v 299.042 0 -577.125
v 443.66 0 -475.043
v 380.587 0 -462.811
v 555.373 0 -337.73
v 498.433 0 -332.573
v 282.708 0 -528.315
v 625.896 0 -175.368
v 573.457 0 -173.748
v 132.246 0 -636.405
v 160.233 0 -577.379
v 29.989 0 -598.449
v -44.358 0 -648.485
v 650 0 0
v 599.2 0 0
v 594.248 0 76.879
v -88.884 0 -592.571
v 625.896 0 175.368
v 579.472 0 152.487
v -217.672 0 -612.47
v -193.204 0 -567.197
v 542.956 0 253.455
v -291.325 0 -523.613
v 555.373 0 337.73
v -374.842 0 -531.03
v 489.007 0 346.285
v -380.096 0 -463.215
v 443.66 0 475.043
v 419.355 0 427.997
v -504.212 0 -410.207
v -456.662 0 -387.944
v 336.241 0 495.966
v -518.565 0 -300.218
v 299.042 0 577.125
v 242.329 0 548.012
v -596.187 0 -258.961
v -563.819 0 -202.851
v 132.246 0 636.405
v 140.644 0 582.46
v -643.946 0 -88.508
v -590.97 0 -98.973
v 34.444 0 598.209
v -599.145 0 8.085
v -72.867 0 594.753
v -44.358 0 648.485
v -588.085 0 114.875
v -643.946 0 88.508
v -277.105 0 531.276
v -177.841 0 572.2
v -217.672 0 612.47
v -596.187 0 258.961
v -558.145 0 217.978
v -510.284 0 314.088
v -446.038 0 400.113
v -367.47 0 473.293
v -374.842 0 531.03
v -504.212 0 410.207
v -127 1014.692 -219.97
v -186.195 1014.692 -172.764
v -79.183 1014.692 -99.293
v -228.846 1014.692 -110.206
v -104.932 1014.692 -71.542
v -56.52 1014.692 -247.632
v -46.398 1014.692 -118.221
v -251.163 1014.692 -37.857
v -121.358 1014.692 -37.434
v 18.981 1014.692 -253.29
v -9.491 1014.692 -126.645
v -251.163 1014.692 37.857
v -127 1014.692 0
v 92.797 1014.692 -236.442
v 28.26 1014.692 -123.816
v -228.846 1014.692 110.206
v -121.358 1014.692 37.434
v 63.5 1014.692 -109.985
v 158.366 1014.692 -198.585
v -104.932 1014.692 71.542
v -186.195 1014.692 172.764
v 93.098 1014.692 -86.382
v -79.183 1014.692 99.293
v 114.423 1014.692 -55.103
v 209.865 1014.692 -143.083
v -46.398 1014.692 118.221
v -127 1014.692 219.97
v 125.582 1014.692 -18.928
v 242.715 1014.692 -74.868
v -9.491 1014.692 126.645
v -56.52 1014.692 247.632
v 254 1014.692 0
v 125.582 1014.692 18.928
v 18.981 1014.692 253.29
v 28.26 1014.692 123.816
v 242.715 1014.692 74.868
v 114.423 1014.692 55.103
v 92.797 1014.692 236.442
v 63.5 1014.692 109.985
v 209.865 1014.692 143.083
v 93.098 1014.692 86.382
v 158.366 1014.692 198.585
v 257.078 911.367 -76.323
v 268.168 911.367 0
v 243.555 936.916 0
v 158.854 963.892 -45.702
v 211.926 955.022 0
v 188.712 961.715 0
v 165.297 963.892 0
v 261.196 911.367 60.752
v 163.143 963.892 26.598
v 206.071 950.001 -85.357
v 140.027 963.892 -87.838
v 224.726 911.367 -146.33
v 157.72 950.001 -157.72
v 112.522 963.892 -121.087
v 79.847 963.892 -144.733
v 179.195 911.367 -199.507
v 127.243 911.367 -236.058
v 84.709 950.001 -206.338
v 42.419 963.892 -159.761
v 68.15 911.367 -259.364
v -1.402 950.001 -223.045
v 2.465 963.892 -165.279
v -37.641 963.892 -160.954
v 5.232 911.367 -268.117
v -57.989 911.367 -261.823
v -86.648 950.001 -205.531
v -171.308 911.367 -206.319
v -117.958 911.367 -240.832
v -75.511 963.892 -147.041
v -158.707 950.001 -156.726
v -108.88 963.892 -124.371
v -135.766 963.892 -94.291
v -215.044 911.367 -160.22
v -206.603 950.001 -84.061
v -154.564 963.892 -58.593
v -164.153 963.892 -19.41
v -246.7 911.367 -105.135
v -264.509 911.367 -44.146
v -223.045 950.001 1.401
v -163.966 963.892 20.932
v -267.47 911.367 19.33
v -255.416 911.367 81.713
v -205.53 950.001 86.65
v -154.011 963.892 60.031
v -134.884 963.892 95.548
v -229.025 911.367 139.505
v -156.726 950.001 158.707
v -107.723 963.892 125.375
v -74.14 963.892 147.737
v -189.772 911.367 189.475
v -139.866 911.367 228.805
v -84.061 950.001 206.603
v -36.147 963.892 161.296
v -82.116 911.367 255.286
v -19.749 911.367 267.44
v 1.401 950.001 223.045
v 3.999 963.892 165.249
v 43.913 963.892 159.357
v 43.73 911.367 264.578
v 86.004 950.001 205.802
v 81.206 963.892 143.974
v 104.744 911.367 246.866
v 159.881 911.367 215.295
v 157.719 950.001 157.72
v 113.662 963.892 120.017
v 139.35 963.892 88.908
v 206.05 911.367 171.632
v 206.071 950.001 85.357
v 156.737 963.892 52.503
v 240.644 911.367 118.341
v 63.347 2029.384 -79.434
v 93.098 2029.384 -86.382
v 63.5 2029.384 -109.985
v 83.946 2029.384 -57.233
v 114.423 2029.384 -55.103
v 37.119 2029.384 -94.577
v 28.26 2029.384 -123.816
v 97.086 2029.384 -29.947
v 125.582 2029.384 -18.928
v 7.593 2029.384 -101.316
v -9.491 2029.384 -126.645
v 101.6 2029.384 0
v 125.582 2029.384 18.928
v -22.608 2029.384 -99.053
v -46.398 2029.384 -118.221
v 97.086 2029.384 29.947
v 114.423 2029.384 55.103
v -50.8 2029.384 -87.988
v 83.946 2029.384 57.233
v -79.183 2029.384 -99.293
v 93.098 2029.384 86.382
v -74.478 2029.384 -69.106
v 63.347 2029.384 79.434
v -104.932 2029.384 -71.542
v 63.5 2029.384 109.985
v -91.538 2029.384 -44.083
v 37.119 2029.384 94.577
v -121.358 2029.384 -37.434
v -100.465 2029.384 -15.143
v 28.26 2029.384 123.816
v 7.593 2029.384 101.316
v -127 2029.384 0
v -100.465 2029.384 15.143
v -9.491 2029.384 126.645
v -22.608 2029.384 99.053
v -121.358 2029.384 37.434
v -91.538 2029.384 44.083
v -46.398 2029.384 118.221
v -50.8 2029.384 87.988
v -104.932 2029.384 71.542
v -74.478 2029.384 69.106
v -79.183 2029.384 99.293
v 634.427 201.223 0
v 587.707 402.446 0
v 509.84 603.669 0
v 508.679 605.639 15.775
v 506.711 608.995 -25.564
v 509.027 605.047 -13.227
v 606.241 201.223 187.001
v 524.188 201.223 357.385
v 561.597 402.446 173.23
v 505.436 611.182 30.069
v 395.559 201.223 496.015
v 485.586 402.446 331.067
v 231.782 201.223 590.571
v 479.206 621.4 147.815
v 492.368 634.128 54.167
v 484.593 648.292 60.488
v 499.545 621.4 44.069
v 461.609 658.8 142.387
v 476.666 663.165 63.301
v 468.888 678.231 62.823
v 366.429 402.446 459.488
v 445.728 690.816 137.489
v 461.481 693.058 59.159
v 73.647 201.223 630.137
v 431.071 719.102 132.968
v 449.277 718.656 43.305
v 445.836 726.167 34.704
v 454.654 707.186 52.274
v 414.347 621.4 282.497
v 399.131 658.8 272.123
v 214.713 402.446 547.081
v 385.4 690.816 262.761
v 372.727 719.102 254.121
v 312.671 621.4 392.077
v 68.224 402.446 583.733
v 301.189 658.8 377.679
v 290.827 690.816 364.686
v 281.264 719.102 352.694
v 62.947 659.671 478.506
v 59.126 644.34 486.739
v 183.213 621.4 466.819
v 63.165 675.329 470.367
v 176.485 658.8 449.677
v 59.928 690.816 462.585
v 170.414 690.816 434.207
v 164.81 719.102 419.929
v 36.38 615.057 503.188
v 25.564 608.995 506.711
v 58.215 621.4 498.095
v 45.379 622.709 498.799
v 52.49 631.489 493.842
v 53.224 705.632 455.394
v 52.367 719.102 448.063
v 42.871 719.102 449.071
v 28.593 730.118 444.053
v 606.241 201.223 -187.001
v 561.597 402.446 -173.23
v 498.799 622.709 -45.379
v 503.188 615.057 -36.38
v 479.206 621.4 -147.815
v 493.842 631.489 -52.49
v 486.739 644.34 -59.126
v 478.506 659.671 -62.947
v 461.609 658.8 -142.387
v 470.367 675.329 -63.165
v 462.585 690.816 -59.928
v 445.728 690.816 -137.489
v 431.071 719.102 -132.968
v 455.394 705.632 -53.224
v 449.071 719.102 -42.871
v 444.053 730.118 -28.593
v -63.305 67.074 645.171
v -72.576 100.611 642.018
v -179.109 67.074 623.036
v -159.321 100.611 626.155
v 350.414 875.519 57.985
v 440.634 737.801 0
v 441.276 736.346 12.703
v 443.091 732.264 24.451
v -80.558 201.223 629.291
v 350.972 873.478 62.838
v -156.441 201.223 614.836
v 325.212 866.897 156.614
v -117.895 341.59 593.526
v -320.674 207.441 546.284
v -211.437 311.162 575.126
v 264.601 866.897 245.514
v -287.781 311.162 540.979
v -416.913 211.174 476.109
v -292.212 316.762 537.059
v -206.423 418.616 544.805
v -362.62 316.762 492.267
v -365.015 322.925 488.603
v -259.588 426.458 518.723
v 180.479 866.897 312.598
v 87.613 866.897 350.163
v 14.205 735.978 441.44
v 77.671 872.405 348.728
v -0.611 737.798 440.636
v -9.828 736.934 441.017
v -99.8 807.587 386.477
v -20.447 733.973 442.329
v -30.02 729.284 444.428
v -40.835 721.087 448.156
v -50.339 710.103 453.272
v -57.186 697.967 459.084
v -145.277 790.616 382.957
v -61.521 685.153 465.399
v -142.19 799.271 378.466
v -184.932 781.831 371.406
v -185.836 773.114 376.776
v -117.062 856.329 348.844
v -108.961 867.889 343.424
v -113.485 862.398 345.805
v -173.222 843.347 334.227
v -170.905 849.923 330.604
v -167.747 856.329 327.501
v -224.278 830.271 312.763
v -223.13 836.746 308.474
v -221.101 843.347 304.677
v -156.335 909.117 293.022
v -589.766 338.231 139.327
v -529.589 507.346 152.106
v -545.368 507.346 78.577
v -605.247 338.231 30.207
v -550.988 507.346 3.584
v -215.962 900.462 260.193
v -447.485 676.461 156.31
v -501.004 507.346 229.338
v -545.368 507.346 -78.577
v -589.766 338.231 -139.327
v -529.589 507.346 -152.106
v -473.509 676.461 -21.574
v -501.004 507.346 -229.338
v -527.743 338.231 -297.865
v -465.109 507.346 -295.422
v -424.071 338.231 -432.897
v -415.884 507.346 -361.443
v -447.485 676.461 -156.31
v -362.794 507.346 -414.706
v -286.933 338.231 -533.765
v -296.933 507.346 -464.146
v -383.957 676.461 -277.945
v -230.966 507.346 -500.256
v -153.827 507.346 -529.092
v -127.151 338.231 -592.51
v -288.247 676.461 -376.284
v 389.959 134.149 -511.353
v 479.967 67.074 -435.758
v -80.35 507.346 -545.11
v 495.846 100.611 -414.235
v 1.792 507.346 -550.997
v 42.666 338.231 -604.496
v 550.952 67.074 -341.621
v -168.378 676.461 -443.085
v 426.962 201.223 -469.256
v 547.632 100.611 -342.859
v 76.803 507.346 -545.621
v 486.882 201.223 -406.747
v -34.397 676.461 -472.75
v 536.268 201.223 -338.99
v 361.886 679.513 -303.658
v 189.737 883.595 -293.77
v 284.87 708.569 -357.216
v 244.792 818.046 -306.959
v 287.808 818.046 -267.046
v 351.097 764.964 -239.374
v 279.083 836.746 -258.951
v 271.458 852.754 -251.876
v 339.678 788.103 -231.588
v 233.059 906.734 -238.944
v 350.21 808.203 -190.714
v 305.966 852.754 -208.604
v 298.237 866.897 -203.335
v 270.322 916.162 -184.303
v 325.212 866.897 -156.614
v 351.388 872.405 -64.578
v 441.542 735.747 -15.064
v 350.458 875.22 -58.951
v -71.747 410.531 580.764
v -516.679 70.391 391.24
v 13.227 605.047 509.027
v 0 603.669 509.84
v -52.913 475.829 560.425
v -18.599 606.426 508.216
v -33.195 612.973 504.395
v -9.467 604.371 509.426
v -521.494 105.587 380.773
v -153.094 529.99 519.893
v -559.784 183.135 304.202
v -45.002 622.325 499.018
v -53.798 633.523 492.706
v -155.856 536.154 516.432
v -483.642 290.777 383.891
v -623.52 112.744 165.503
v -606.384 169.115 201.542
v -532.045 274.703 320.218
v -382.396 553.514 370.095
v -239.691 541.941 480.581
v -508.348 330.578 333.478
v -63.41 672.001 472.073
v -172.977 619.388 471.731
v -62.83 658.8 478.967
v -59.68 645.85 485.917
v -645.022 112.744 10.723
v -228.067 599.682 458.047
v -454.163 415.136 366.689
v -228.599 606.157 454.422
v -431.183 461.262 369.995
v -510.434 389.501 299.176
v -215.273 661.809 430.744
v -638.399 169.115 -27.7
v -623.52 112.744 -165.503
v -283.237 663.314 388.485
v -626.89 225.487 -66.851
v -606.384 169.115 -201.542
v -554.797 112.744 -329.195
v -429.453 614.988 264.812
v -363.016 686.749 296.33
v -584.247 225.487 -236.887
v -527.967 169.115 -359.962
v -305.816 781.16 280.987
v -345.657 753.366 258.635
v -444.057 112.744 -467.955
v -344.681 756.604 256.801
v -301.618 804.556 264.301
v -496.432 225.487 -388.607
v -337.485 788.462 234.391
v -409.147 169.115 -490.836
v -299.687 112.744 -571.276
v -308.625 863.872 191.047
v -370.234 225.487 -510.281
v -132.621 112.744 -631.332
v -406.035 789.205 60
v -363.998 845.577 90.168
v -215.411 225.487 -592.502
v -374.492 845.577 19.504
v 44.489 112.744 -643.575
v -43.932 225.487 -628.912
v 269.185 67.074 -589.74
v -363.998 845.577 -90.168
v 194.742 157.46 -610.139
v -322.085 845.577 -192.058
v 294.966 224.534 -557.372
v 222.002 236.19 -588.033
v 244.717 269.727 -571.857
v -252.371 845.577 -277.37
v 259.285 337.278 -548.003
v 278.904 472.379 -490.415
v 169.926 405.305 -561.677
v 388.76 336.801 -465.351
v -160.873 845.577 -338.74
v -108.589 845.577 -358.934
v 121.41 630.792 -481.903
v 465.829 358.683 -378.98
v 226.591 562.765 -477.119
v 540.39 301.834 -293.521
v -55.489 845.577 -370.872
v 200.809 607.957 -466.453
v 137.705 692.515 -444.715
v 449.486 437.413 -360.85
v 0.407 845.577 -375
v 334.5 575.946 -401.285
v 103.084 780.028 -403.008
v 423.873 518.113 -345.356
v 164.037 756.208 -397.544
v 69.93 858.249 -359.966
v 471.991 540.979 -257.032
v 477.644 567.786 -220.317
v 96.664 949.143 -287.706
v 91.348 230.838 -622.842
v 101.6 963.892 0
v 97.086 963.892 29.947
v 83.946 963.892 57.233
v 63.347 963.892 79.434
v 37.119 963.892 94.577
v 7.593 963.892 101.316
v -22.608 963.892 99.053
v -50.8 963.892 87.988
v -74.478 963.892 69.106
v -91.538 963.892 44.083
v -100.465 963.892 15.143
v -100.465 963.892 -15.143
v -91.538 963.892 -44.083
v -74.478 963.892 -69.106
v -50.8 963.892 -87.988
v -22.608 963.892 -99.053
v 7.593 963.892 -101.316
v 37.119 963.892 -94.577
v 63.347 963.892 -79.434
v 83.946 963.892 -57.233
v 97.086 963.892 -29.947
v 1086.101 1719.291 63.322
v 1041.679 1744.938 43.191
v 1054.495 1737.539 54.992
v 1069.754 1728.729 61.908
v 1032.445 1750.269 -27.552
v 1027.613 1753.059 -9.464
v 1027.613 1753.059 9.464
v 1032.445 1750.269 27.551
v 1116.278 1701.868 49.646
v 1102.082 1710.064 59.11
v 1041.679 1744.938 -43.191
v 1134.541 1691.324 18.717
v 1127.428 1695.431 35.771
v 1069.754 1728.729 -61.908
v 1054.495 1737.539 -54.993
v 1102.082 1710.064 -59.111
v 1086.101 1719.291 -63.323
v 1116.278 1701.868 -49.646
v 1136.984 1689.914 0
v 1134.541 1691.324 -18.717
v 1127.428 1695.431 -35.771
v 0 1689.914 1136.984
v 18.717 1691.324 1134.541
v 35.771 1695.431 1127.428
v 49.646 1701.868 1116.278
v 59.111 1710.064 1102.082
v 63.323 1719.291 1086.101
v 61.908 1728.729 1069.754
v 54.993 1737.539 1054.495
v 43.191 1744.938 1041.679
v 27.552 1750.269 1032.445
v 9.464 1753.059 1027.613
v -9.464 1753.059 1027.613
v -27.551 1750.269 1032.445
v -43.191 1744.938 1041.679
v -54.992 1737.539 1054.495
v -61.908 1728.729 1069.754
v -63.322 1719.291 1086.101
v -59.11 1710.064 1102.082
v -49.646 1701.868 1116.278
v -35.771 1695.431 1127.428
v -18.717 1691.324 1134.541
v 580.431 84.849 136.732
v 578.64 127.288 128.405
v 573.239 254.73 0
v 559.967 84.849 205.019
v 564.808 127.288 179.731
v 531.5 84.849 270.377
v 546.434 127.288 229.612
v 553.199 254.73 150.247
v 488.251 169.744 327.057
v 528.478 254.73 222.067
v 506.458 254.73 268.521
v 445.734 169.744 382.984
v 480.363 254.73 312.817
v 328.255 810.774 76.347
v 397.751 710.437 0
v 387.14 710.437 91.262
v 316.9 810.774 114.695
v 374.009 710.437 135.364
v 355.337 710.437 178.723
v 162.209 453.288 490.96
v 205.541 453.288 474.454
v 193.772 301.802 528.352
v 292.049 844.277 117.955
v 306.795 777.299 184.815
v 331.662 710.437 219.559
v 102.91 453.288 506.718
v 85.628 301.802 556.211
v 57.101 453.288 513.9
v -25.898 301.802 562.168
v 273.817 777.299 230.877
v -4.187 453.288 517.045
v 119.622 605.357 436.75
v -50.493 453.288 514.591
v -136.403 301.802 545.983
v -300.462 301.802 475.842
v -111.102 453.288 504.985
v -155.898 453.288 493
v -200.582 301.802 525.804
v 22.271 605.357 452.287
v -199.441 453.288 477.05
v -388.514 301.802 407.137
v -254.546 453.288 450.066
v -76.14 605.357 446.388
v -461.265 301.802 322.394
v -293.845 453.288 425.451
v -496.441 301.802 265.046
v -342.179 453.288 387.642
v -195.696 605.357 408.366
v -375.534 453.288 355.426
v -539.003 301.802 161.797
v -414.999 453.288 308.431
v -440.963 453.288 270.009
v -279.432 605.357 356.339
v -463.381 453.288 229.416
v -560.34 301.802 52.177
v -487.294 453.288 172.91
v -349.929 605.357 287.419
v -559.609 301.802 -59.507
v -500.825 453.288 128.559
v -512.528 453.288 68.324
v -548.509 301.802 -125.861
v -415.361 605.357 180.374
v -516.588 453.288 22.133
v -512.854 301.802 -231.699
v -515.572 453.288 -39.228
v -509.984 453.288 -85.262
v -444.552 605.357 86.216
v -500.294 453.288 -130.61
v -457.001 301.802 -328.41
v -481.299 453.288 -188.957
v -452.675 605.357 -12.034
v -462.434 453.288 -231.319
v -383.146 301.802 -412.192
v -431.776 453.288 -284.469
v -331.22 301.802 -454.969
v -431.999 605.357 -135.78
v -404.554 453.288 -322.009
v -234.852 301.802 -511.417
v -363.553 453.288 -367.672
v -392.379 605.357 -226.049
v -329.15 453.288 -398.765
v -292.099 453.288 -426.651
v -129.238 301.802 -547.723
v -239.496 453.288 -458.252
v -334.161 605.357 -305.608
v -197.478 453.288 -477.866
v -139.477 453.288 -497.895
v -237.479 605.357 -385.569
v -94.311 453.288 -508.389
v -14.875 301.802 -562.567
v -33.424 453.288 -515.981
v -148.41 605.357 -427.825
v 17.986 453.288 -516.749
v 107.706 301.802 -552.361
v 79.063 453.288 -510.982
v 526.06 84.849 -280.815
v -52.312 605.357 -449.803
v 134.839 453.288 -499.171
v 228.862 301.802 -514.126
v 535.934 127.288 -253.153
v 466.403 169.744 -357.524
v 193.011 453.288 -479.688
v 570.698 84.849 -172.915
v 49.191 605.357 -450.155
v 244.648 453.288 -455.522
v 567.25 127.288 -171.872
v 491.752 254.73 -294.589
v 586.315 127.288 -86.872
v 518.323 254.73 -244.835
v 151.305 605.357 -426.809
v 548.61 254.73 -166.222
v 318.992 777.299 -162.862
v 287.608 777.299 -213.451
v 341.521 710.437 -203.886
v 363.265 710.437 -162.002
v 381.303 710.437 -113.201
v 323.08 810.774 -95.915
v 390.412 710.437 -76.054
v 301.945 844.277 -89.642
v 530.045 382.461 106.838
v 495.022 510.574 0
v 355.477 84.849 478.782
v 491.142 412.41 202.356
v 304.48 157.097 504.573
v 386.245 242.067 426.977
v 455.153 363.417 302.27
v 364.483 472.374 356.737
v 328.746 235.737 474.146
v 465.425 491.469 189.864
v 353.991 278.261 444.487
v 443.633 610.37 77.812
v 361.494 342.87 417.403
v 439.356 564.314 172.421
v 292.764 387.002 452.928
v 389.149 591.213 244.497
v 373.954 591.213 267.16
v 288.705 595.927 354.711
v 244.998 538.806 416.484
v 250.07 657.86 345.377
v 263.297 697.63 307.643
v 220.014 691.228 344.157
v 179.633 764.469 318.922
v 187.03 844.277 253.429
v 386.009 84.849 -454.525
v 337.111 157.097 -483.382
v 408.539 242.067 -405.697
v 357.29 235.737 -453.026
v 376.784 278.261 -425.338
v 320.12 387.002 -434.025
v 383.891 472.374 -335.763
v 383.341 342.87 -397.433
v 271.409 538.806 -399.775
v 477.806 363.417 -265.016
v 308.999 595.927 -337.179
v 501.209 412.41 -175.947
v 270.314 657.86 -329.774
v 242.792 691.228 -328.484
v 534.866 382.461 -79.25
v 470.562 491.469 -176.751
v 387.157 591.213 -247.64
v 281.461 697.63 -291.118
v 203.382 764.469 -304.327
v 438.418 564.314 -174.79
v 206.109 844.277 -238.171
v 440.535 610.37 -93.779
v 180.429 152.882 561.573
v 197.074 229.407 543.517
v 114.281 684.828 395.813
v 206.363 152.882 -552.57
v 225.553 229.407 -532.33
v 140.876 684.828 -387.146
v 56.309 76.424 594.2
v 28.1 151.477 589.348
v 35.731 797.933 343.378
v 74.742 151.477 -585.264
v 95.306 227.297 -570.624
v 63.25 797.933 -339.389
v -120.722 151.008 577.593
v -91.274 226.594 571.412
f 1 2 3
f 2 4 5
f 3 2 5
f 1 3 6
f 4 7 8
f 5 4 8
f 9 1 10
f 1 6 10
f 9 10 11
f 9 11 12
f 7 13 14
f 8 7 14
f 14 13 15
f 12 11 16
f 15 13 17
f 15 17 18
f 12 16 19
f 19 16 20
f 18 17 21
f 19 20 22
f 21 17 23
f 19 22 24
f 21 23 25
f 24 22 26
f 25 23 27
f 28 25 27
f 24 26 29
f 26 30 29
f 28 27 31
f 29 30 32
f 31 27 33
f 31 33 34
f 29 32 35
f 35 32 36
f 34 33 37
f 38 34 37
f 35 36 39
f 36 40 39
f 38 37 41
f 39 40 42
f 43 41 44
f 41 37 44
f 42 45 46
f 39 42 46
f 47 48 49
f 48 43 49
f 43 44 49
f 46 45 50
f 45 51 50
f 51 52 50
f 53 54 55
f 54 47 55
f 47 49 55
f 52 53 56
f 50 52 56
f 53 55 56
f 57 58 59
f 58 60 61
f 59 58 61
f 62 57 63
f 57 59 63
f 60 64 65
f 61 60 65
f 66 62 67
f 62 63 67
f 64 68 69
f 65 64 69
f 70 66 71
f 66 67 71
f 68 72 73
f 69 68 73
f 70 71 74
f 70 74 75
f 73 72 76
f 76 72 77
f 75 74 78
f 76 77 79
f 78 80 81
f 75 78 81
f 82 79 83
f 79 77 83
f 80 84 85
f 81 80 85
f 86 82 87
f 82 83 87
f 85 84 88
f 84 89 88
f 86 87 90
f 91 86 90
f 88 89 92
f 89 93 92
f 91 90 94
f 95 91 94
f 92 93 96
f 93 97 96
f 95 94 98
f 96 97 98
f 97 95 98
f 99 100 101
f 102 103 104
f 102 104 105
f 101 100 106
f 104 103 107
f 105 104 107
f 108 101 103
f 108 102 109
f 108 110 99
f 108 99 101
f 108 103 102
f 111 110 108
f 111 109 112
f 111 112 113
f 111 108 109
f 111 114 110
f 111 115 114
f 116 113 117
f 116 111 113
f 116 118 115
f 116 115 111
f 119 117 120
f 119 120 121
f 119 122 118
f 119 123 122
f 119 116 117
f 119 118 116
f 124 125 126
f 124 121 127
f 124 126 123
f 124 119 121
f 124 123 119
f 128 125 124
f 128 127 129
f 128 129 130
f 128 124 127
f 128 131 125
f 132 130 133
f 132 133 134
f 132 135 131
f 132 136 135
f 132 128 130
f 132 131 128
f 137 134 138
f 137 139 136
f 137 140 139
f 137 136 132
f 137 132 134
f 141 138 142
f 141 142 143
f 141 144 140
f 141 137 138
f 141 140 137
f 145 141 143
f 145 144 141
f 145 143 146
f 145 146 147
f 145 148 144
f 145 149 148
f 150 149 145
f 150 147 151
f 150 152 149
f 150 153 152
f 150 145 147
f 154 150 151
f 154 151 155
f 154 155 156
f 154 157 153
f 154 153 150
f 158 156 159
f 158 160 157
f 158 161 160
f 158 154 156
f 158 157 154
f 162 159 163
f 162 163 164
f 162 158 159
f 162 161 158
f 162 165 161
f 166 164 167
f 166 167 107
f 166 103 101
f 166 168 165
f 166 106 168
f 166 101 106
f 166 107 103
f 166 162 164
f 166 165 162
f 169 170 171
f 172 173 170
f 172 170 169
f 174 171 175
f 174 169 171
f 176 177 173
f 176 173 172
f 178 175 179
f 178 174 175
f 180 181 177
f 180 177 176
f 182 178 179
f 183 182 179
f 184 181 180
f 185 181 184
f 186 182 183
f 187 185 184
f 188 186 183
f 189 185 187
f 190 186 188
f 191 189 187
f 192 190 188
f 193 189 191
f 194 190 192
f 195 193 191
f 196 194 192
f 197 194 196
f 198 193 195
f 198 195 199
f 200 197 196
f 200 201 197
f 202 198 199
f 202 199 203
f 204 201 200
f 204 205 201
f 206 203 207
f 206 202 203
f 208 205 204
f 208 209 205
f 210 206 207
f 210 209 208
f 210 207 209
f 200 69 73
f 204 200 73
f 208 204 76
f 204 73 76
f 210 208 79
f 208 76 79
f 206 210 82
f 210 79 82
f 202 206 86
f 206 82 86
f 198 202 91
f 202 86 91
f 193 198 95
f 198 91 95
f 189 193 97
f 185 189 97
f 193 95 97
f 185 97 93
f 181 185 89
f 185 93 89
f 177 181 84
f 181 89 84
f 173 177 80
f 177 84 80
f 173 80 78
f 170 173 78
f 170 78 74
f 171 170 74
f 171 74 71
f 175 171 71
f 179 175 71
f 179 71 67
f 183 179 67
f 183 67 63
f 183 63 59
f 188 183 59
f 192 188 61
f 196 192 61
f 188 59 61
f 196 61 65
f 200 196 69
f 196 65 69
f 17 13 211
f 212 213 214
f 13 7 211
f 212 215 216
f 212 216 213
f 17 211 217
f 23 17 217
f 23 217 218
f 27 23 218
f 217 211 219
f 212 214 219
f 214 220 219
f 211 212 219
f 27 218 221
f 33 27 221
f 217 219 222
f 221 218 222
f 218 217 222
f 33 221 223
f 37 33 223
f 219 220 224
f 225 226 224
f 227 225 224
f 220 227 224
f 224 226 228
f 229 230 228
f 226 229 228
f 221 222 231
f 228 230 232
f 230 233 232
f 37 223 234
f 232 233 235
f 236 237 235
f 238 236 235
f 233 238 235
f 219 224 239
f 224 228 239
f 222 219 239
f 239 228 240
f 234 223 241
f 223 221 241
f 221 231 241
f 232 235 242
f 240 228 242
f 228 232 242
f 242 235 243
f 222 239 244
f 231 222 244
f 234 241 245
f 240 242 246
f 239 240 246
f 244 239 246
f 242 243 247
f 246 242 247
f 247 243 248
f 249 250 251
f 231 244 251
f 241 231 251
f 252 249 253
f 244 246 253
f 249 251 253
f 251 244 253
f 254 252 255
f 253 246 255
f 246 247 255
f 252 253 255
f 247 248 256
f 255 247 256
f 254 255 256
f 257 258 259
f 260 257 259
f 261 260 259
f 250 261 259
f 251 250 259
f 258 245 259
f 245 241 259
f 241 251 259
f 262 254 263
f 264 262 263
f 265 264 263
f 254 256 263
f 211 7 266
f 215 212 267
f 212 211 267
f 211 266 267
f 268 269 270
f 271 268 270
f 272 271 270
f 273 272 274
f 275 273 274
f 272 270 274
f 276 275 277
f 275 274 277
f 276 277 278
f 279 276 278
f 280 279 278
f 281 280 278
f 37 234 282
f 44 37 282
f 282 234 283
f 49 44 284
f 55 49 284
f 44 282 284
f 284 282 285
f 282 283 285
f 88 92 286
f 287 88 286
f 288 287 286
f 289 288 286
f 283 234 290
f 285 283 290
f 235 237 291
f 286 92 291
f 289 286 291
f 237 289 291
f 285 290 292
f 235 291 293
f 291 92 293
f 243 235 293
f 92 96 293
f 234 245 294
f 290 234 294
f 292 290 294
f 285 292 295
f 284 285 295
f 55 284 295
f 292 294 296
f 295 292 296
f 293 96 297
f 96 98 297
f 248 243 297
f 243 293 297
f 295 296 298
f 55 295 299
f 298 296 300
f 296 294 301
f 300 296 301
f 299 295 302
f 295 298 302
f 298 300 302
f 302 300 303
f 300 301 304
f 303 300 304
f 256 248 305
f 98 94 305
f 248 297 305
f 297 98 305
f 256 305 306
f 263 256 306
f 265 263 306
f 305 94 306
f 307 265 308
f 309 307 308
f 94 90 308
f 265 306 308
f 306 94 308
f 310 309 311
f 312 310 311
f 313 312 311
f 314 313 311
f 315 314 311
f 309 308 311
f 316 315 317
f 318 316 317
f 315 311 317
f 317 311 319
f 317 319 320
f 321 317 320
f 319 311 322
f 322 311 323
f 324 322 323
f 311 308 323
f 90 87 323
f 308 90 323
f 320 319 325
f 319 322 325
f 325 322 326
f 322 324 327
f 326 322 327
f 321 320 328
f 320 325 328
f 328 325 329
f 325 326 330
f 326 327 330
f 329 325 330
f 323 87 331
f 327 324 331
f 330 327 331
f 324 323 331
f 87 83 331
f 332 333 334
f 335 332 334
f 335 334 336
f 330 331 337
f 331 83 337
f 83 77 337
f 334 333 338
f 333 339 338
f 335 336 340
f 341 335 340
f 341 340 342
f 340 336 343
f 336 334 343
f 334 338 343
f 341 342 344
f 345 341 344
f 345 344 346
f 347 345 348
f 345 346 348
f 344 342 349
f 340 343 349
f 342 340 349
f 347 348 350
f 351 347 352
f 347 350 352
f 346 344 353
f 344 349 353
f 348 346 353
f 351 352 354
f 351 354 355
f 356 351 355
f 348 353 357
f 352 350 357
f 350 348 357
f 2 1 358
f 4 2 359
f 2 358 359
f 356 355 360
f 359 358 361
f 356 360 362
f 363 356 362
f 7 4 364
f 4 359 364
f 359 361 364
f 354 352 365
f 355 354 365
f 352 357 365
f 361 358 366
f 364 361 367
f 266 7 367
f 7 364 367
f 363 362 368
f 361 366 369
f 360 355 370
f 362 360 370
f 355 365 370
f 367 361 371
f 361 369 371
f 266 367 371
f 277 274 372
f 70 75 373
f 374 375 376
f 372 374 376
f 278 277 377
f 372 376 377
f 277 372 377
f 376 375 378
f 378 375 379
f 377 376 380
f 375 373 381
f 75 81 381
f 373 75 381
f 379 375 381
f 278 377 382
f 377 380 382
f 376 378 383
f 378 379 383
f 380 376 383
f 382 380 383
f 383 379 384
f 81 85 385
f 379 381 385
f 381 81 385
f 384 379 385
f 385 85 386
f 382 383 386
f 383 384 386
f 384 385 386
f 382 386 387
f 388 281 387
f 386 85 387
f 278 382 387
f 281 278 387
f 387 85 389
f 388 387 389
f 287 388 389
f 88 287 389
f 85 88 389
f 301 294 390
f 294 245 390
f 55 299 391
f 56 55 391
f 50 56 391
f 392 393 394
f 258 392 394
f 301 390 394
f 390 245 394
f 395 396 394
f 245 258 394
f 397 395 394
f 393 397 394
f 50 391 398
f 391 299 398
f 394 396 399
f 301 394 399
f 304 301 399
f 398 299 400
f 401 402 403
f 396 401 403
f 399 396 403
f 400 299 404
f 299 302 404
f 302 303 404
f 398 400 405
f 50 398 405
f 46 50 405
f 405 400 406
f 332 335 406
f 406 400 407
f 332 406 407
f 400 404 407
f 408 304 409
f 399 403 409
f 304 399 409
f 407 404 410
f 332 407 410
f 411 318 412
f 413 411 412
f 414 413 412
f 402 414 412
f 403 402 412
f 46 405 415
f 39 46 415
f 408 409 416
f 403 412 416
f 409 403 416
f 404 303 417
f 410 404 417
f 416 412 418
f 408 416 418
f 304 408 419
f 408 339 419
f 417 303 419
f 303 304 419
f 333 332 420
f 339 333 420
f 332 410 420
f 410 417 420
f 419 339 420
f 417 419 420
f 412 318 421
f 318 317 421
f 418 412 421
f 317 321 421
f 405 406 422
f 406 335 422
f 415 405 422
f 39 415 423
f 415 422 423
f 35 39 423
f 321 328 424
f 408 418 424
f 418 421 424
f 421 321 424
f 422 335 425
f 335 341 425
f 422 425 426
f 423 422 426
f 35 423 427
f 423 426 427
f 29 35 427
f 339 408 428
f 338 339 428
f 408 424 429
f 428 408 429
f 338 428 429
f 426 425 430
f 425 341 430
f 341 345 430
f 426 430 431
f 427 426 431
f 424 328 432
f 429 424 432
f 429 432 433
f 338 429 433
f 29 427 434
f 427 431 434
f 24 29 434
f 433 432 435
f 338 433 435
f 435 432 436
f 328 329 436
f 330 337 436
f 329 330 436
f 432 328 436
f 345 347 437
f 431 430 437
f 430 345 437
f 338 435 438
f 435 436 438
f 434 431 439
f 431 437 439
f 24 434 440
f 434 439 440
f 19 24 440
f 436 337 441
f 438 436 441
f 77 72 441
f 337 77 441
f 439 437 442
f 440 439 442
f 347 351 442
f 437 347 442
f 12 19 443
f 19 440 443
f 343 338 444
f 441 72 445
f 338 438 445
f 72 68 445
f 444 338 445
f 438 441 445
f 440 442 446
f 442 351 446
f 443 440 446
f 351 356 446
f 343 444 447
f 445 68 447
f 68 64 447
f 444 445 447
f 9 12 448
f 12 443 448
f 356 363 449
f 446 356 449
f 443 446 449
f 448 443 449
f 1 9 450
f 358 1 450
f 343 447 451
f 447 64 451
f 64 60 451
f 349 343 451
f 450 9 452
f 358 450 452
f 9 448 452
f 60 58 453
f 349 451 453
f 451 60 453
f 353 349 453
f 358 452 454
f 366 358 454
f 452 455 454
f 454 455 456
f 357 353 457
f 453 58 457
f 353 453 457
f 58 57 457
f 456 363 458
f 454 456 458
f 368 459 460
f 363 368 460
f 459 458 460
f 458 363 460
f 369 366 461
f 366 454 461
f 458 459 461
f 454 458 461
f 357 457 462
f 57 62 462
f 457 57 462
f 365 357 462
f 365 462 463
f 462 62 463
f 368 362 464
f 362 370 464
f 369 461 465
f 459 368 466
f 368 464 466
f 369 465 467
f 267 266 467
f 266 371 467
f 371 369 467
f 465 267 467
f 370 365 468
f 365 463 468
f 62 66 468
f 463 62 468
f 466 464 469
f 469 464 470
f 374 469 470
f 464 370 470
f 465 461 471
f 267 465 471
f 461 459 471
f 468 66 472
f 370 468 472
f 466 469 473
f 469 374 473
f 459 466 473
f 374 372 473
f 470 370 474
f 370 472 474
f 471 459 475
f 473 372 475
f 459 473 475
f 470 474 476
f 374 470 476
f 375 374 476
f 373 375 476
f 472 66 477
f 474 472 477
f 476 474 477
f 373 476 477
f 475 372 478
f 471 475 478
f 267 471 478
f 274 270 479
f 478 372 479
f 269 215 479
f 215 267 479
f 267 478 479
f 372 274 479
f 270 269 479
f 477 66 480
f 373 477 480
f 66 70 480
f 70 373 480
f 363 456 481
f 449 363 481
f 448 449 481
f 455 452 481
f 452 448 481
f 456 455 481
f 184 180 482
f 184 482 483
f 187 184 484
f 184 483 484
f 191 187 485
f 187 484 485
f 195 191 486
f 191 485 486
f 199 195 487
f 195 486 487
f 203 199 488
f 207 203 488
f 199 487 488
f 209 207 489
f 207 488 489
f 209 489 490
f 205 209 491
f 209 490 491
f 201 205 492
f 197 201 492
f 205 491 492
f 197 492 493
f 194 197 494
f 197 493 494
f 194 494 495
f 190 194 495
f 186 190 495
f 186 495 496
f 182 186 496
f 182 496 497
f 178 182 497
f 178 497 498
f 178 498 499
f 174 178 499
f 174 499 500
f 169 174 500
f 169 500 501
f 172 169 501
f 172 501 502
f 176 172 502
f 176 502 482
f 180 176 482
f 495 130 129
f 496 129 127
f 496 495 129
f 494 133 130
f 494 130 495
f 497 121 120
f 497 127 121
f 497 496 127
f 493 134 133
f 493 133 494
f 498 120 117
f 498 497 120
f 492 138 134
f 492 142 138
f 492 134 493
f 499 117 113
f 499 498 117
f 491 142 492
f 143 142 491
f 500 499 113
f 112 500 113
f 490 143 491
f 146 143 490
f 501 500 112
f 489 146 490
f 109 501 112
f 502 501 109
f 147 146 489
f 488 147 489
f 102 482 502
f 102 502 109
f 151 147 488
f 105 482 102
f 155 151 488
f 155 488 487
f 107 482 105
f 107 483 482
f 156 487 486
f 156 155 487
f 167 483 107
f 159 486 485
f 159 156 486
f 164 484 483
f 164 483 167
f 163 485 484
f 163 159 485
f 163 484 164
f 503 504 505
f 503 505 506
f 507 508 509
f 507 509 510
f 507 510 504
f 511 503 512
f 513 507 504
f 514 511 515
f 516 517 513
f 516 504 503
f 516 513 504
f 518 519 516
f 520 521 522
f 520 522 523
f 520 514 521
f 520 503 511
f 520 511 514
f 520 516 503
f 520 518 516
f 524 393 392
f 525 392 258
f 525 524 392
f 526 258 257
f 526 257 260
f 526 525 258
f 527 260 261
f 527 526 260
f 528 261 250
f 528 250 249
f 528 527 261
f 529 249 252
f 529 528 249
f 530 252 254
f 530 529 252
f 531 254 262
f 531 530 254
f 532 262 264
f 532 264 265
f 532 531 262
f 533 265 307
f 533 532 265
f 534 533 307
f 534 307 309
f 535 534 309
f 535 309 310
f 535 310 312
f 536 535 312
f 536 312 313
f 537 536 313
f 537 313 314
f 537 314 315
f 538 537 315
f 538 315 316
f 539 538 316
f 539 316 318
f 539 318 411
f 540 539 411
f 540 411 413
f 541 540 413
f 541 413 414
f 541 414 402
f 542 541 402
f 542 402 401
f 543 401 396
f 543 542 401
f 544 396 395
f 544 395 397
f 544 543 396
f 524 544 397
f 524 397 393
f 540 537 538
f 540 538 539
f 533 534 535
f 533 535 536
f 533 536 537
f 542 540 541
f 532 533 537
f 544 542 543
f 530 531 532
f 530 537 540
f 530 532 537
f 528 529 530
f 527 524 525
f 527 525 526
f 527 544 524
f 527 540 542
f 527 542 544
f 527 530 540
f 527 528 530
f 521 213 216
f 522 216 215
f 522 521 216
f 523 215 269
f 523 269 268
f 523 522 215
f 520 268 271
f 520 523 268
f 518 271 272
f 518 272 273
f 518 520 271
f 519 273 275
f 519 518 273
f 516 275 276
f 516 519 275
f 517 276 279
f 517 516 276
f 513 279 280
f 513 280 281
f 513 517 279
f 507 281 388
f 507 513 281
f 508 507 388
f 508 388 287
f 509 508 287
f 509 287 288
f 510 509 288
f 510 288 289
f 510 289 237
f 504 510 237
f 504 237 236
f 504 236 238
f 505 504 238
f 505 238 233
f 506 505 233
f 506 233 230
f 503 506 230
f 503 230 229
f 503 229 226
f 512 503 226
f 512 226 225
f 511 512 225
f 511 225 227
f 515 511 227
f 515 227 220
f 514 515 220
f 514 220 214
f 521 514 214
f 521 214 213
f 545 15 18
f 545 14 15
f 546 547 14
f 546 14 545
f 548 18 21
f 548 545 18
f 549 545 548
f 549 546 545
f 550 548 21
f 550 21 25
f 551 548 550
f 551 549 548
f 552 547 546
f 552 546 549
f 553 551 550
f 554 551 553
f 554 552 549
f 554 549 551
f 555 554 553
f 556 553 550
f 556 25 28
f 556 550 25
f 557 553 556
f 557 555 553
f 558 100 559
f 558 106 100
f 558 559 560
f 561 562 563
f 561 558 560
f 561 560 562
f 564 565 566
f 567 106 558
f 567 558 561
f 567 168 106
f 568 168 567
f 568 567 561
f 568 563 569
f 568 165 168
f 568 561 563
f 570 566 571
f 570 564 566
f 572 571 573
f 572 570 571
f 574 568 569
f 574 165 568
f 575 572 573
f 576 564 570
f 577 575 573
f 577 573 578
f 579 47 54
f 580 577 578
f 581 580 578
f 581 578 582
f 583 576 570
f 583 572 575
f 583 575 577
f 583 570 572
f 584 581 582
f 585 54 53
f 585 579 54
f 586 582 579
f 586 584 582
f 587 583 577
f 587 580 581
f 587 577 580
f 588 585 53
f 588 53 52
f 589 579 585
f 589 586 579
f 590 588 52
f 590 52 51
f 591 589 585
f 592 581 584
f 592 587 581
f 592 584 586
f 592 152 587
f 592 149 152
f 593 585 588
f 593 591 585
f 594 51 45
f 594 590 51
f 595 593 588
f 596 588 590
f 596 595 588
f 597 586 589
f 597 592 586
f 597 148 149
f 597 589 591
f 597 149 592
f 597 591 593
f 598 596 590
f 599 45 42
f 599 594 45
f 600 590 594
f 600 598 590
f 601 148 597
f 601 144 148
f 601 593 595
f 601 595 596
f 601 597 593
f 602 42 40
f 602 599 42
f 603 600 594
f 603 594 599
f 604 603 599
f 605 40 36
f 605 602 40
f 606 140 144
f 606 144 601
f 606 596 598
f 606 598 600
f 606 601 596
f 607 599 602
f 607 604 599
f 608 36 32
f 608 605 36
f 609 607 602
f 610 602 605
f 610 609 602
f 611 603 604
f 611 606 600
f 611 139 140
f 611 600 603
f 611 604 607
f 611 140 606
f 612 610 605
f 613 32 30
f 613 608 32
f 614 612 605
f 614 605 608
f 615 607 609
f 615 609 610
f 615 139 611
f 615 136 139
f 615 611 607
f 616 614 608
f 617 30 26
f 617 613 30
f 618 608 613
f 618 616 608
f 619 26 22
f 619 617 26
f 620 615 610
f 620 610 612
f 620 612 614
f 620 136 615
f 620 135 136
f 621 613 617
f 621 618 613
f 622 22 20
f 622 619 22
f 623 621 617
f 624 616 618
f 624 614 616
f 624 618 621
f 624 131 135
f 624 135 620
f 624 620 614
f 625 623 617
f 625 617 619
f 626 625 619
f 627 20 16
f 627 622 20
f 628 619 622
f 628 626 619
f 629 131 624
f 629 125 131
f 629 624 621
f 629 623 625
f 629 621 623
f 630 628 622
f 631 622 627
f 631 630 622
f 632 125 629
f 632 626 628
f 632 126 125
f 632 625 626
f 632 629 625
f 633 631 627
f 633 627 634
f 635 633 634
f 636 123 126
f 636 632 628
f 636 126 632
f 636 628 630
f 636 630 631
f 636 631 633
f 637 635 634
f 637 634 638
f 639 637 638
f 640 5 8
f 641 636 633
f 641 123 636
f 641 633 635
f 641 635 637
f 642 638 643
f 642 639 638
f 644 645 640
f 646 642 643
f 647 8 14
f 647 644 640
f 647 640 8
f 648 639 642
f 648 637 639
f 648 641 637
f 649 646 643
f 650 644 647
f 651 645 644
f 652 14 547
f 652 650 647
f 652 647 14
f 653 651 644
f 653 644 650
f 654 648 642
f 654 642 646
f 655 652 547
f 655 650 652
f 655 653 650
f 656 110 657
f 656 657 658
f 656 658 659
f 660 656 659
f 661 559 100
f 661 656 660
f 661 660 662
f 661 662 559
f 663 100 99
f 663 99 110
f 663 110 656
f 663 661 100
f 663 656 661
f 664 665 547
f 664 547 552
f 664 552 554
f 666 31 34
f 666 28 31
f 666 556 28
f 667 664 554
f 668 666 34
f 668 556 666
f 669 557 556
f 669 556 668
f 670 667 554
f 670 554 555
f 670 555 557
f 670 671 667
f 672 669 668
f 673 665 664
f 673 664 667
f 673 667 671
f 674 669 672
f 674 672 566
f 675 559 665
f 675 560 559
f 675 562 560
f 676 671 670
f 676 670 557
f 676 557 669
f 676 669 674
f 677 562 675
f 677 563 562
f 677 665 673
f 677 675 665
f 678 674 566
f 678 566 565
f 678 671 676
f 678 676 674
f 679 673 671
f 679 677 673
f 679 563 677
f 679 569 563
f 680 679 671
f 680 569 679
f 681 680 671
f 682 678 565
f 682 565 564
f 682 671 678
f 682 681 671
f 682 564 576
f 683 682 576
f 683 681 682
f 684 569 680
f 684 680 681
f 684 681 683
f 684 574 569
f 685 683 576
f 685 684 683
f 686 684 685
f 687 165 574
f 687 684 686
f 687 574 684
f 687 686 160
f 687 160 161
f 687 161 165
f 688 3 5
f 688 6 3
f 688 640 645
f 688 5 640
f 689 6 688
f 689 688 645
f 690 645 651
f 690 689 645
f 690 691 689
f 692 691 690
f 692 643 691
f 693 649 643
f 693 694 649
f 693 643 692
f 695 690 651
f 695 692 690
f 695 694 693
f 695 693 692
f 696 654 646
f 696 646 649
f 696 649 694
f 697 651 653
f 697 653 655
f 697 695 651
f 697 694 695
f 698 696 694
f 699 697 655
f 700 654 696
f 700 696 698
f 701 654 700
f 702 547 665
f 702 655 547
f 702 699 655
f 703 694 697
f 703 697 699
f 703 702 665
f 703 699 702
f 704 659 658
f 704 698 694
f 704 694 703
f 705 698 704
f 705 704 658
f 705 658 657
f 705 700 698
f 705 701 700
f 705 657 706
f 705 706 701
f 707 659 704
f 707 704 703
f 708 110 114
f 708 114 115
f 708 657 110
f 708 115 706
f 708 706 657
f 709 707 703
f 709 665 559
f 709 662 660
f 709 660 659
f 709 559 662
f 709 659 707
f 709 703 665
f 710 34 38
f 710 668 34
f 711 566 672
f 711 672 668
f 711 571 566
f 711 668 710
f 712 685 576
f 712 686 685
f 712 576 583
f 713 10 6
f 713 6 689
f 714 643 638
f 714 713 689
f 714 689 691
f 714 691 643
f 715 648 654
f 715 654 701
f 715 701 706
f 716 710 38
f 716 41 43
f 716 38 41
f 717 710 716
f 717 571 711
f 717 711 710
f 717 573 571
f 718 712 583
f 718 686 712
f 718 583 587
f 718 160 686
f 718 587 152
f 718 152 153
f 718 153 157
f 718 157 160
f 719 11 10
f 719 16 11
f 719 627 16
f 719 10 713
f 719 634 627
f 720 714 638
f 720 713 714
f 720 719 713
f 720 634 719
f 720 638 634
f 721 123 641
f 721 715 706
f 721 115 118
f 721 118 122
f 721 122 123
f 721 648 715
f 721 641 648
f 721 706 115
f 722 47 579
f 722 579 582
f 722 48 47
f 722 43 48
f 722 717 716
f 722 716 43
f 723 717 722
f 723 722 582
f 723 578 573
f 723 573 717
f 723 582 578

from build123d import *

# Parameters (mm, degrees)
SHELL1_T            = -50.8
SKETCH2_R           = 126.999999999
BOSS_EXTRUDE1_DEPTH = 1014.6920778
SKETCH8_R           = 50.799999999
CUT_EXTRUDE1_DEPTH  = 989.2920778
CUT_EXTRUDE2_REACH  = 1409.222
SKETCH9_R           = 101.6
FILLET2_R           = 127
BOSS_EXTRUDE4_REACH = 2510.949
SKETCH5_R           = 63.5
CIRPATTERN1_COUNT   = 2
CIRPATTERN1_ANGLE   = 90


with BuildPart() as part:
    # Sketch1 → Revolve1 (revolve)
    with BuildSketch(Plane.XY):
        with BuildLine():
            Line((0, 0), (650, 0))
            add(Edge.make_bspline(
                [(650, 0), (650, 507.346035759), (254, 1014.692071517)],
                knots=[0, 0, 0, 1, 1, 1], degree=2))
            Line((254, 1014.692071517), (0, 1014.692071517))
            Line((0, 1014.692071517), (0, 0))
        make_face()
    revolve(axis=Axis((0, 1014.692071517, 0), (0, -1, 0)))

    # Shell1
    shell1_openings = [part.faces().sort_by_distance(p)[0] for p in [
        (0, 0, 0),
    ]]
    offset(amount=SHELL1_T, openings=shell1_openings, kind=Kind.INTERSECTION)

    # Sketch2 → Boss-Extrude1 (add)
    with BuildSketch(Plane(origin=(0, 1014.692071518, 0), x_dir=(1, 0, 0), z_dir=(0, 1, 0))):
        with Locations(Location((0, 0, 0), (0, 0, 180))):
            Circle(SKETCH2_R)
    extrude(amount=BOSS_EXTRUDE1_DEPTH)

    # Sketch8 → Cut-Extrude1 (cut)
    with BuildSketch(Plane(origin=(0, 2029.384149318, 0), x_dir=(1, 0, 0), z_dir=(0, 1, 0))):
        with Locations(Location((0, 0, 0), (0, 0, 180))):
            Circle(SKETCH8_R)
    extrude(amount=-CUT_EXTRUDE1_DEPTH, mode=Mode.SUBTRACT)

    # Sketch9 → Cut-Extrude2 (cut, up to next)
    with BuildSketch(Plane.XZ.offset(-963.892071518), mode=Mode.PRIVATE) as cut_extrude2_sk1:
        Circle(SKETCH9_R)
    cut_extrude2_tool1 = extrude(cut_extrude2_sk1.sketch, amount=-CUT_EXTRUDE2_REACH, mode=Mode.PRIVATE) & part.part
    add(cut_extrude2_tool1.solids().sort_by_distance((0, 963.892072, 0))[0], mode=Mode.SUBTRACT)

    # Fillet2
    fillet2_edges = [part.edges().sort_by_distance(p)[0] for p in [
        (-229.058684879, 963.892071517, 8.8e-08),
    ]]
    fillet(fillet2_edges, radius=FILLET2_R)

    # Sketch5 → Boss-Extrude4 (add, up to next)
    with BuildSketch(Plane(origin=(0.000183349, 1759.76362049, 1016), x_dir=(0, 0.49999999999999495, -0.8660254037844416), z_dir=(9.023101202455188e-08, 0.866025403784438, 0.4999999999999929)), mode=Mode.PRIVATE) as boss_extrude4_sk1:
        with Locations(Location((-76.2, 0, 0), (0, 0, 180))):
            Circle(SKETCH5_R)
    boss_extrude4_tool1 = extrude(boss_extrude4_sk1.sketch, amount=-BOSS_EXTRUDE4_REACH, mode=Mode.PRIVATE) - part.part
    boss_extrude4 = boss_extrude4_tool1.solids().sort_by_distance((0.000183, 1721.66362, 1081.991136))[0]
    add(boss_extrude4)

    # CirPattern1: Boss-Extrude4 ×2 about axis
    cirpattern1_axis = Axis((0, 2029.384149318, 0), (0, 1, 0))
    for i in range(1, CIRPATTERN1_COUNT):
        add(boss_extrude4.rotate(cirpattern1_axis, i * CIRPATTERN1_ANGLE / (CIRPATTERN1_COUNT - 1)))


solid = part.part
